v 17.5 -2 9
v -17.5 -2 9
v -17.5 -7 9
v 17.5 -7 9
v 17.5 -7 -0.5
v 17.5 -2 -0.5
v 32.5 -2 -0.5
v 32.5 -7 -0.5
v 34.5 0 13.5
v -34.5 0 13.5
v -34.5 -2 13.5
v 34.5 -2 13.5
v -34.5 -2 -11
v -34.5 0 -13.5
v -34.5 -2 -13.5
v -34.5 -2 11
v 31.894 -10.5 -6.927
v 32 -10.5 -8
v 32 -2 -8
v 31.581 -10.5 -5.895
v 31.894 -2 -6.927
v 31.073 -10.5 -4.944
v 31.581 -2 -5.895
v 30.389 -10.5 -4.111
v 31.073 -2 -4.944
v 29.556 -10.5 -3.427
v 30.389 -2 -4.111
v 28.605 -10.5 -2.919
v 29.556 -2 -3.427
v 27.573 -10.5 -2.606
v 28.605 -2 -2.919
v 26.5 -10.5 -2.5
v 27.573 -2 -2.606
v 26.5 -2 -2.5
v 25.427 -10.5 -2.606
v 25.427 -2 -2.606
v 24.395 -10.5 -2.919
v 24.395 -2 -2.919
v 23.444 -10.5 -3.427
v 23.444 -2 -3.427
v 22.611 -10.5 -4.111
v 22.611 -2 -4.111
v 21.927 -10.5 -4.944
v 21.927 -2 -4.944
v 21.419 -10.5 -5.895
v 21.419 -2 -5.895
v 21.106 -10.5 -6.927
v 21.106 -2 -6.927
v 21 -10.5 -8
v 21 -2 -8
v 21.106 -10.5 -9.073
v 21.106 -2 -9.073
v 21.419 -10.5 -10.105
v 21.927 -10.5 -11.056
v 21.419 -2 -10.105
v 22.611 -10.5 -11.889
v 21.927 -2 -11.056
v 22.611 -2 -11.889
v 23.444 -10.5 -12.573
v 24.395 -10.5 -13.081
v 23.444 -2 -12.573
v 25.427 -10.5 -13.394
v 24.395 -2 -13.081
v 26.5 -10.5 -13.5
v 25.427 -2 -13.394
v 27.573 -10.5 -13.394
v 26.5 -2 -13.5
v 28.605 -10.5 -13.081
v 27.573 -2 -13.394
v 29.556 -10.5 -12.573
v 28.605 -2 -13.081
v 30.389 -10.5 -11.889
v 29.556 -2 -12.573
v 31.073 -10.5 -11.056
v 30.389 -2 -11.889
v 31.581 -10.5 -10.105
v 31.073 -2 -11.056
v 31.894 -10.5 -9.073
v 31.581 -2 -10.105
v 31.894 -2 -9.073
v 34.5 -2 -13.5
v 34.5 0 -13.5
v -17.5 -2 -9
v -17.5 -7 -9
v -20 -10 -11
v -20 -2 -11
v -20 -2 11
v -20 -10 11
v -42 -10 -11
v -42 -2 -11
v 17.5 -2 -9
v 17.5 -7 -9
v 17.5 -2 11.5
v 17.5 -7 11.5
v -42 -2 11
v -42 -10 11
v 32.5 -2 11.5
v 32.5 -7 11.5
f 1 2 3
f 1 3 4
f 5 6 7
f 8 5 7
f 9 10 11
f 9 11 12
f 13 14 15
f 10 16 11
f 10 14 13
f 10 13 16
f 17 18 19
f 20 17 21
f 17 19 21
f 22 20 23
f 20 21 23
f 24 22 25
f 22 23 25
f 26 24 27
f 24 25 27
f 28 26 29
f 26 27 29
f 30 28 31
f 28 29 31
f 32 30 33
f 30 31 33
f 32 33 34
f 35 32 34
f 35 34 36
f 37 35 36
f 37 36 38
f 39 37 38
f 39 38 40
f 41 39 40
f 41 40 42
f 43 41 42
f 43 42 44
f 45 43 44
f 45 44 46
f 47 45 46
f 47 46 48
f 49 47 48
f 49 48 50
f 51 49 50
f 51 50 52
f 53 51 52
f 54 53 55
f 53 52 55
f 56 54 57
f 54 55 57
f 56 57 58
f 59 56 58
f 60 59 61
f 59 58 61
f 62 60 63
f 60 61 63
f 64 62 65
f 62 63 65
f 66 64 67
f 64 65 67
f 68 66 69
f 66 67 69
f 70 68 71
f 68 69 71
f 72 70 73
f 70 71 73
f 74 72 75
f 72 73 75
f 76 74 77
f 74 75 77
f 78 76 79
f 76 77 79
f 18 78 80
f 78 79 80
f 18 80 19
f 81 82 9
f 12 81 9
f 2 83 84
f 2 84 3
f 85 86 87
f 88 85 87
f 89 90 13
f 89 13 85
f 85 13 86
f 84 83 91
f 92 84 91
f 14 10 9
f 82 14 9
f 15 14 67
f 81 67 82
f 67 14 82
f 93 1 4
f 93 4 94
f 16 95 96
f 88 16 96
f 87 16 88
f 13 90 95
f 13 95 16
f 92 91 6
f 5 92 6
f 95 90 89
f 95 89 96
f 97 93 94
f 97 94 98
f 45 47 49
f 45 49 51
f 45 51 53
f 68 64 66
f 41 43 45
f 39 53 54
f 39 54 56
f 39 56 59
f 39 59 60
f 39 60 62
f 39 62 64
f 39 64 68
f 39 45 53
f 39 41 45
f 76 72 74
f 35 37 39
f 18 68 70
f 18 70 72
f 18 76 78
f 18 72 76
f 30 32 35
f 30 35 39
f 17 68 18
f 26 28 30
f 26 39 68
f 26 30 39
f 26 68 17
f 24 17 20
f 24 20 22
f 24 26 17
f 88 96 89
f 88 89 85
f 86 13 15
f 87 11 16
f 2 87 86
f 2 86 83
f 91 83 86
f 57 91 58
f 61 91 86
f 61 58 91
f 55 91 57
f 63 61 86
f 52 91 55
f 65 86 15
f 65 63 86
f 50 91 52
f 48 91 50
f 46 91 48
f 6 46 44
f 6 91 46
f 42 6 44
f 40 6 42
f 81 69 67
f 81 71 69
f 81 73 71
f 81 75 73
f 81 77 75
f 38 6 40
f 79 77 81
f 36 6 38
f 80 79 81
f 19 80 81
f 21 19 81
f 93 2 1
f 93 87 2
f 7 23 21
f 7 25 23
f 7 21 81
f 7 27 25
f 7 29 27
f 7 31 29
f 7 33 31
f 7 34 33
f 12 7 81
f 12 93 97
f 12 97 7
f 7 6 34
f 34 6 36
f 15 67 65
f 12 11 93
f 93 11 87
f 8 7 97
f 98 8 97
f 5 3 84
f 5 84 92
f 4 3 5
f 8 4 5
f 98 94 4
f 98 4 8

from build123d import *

# Parameters (mm, degrees)
F0_W     = 69
F0_H     = 27
F1_DEPTH = 2
F2_W     = 22
F2_H     = 22
F3_DEPTH = 8
F4_W     = 35
F4_H     = 18
F5_DEPTH = 5
F6_W     = 15
F6_H     = 12
F7_DEPTH = 5
F8_R     = 5.5
F9_DEPTH = 8.5


with BuildPart() as f1:
    # F0 (on Front) → F1 (new body)
    with BuildSketch(Plane.XZ):
        Rectangle(F0_W, F0_H)
    extrude(amount=F1_DEPTH)

    # F2 (on face) → F3 (join)
    with BuildSketch(Plane.XZ.offset(2)):
        with Locations((-31, 0)):
            Rectangle(F2_W, F2_H)
    extrude(amount=F3_DEPTH)

    # F4 (on face) → F5 (join)
    with BuildSketch(Plane.XZ.offset(2)):
        Rectangle(F4_W, F4_H)
    extrude(amount=F5_DEPTH)

    # F6 (on face) → F7 (join)
    with BuildSketch(Plane.XZ.offset(2)):
        with Locations((25, 5.5)):
            Rectangle(F6_W, F6_H)
    extrude(amount=F7_DEPTH)

    # F8 (on face) → F9 (join)
    with BuildSketch(Plane.XZ.offset(2)):
        with Locations((26.5, -8)):
            Circle(F8_R)
    extrude(amount=F9_DEPTH)


solid = f1.part
